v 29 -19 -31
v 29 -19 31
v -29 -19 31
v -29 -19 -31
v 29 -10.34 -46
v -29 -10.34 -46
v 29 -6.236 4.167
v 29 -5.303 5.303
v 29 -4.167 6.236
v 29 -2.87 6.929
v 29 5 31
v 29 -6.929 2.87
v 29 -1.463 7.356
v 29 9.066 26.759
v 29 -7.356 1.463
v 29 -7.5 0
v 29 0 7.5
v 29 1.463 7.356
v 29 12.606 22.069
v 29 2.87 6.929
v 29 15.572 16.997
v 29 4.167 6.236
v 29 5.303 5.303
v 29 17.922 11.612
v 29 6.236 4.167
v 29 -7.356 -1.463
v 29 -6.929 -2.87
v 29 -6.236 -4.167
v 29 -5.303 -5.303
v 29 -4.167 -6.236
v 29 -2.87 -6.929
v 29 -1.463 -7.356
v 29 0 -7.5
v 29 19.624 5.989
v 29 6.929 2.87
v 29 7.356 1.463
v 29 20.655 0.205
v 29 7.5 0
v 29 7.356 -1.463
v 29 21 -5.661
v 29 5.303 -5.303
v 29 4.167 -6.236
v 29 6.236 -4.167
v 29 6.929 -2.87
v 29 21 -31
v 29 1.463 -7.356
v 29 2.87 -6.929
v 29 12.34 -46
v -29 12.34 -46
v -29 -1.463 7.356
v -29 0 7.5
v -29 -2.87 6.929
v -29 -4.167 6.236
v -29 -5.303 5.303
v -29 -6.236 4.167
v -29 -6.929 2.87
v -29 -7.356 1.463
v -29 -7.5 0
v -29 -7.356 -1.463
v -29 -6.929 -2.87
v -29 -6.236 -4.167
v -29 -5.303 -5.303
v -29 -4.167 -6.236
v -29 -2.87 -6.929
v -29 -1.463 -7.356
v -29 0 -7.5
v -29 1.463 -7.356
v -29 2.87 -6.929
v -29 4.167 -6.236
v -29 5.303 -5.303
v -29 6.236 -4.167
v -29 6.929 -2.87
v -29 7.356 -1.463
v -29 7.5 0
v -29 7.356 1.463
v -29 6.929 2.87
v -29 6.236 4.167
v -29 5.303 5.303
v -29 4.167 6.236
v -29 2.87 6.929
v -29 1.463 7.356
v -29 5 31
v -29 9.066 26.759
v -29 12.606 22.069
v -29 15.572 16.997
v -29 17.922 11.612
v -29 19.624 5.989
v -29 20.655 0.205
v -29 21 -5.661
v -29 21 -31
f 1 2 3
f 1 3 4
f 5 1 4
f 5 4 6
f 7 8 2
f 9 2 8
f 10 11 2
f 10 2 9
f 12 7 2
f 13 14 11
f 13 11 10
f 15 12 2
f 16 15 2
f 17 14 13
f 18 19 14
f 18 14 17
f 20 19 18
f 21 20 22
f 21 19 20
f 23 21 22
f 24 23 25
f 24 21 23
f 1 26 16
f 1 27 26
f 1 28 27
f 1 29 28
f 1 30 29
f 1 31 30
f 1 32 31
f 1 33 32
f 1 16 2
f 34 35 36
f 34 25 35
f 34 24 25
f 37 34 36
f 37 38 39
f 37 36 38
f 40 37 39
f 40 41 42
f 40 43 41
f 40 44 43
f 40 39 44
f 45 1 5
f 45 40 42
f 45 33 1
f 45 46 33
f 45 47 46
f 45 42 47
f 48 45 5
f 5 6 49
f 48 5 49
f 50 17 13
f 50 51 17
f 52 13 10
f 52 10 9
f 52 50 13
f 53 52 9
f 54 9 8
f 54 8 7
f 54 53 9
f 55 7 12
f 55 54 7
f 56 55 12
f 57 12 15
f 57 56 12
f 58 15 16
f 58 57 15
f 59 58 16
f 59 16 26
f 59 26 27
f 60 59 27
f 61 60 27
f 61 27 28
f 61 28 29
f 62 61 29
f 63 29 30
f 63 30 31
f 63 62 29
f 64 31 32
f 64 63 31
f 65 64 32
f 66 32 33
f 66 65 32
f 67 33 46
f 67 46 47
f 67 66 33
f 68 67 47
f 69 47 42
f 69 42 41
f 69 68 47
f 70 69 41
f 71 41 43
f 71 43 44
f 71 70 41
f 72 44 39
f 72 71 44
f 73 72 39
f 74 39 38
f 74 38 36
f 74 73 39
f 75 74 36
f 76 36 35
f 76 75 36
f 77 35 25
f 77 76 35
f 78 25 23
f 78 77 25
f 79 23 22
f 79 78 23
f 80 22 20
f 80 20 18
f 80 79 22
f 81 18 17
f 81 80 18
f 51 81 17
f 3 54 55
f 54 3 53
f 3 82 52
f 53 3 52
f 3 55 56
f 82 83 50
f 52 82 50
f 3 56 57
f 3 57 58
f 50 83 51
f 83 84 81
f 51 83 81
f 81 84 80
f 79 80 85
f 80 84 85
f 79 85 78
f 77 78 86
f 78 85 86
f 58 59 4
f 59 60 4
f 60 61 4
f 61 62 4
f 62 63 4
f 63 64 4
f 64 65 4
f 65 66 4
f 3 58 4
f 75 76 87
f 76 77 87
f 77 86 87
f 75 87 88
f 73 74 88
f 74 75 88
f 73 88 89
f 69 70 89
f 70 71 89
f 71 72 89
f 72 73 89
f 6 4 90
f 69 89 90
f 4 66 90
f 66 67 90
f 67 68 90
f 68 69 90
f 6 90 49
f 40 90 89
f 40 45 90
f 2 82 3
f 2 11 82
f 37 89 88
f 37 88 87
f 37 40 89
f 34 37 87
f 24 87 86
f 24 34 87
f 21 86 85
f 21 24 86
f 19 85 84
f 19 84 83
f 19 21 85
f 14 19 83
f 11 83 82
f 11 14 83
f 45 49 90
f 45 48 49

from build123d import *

# Parameters (mm, degrees)
SKETCH1_R           = 7.5
BOSS_EXTRUDE1_DEPTH = 29


with BuildPart() as part:
    # Sketch1 → Boss-Extrude1 (new, symmetric)
    with BuildSketch(Plane(origin=(0, 0, 0), x_dir=(0, 0, -1), z_dir=(1, 0, 0))):
        with BuildLine():
            Line((-31, 5), (-31, -19))
            Line((-31, -19), (31, -19))
            Line((31, -19), (46, -10.339745962))
            Line((46, -10.339745962), (46, 12.339745962))
            Line((46, 12.339745962), (31, 21))
            Line((31, 21), (5.66060556, 21))
            ThreePointArc((5.66060556, 21), (-14.33939444, 16.82575695), (-31, 5))
        make_face()
        with Locations(Location((0, 0, 0), (0, 0, 180))):
            Circle(SKETCH1_R, mode=Mode.SUBTRACT)
    extrude(amount=BOSS_EXTRUDE1_DEPTH, both=True)


solid = part.part
